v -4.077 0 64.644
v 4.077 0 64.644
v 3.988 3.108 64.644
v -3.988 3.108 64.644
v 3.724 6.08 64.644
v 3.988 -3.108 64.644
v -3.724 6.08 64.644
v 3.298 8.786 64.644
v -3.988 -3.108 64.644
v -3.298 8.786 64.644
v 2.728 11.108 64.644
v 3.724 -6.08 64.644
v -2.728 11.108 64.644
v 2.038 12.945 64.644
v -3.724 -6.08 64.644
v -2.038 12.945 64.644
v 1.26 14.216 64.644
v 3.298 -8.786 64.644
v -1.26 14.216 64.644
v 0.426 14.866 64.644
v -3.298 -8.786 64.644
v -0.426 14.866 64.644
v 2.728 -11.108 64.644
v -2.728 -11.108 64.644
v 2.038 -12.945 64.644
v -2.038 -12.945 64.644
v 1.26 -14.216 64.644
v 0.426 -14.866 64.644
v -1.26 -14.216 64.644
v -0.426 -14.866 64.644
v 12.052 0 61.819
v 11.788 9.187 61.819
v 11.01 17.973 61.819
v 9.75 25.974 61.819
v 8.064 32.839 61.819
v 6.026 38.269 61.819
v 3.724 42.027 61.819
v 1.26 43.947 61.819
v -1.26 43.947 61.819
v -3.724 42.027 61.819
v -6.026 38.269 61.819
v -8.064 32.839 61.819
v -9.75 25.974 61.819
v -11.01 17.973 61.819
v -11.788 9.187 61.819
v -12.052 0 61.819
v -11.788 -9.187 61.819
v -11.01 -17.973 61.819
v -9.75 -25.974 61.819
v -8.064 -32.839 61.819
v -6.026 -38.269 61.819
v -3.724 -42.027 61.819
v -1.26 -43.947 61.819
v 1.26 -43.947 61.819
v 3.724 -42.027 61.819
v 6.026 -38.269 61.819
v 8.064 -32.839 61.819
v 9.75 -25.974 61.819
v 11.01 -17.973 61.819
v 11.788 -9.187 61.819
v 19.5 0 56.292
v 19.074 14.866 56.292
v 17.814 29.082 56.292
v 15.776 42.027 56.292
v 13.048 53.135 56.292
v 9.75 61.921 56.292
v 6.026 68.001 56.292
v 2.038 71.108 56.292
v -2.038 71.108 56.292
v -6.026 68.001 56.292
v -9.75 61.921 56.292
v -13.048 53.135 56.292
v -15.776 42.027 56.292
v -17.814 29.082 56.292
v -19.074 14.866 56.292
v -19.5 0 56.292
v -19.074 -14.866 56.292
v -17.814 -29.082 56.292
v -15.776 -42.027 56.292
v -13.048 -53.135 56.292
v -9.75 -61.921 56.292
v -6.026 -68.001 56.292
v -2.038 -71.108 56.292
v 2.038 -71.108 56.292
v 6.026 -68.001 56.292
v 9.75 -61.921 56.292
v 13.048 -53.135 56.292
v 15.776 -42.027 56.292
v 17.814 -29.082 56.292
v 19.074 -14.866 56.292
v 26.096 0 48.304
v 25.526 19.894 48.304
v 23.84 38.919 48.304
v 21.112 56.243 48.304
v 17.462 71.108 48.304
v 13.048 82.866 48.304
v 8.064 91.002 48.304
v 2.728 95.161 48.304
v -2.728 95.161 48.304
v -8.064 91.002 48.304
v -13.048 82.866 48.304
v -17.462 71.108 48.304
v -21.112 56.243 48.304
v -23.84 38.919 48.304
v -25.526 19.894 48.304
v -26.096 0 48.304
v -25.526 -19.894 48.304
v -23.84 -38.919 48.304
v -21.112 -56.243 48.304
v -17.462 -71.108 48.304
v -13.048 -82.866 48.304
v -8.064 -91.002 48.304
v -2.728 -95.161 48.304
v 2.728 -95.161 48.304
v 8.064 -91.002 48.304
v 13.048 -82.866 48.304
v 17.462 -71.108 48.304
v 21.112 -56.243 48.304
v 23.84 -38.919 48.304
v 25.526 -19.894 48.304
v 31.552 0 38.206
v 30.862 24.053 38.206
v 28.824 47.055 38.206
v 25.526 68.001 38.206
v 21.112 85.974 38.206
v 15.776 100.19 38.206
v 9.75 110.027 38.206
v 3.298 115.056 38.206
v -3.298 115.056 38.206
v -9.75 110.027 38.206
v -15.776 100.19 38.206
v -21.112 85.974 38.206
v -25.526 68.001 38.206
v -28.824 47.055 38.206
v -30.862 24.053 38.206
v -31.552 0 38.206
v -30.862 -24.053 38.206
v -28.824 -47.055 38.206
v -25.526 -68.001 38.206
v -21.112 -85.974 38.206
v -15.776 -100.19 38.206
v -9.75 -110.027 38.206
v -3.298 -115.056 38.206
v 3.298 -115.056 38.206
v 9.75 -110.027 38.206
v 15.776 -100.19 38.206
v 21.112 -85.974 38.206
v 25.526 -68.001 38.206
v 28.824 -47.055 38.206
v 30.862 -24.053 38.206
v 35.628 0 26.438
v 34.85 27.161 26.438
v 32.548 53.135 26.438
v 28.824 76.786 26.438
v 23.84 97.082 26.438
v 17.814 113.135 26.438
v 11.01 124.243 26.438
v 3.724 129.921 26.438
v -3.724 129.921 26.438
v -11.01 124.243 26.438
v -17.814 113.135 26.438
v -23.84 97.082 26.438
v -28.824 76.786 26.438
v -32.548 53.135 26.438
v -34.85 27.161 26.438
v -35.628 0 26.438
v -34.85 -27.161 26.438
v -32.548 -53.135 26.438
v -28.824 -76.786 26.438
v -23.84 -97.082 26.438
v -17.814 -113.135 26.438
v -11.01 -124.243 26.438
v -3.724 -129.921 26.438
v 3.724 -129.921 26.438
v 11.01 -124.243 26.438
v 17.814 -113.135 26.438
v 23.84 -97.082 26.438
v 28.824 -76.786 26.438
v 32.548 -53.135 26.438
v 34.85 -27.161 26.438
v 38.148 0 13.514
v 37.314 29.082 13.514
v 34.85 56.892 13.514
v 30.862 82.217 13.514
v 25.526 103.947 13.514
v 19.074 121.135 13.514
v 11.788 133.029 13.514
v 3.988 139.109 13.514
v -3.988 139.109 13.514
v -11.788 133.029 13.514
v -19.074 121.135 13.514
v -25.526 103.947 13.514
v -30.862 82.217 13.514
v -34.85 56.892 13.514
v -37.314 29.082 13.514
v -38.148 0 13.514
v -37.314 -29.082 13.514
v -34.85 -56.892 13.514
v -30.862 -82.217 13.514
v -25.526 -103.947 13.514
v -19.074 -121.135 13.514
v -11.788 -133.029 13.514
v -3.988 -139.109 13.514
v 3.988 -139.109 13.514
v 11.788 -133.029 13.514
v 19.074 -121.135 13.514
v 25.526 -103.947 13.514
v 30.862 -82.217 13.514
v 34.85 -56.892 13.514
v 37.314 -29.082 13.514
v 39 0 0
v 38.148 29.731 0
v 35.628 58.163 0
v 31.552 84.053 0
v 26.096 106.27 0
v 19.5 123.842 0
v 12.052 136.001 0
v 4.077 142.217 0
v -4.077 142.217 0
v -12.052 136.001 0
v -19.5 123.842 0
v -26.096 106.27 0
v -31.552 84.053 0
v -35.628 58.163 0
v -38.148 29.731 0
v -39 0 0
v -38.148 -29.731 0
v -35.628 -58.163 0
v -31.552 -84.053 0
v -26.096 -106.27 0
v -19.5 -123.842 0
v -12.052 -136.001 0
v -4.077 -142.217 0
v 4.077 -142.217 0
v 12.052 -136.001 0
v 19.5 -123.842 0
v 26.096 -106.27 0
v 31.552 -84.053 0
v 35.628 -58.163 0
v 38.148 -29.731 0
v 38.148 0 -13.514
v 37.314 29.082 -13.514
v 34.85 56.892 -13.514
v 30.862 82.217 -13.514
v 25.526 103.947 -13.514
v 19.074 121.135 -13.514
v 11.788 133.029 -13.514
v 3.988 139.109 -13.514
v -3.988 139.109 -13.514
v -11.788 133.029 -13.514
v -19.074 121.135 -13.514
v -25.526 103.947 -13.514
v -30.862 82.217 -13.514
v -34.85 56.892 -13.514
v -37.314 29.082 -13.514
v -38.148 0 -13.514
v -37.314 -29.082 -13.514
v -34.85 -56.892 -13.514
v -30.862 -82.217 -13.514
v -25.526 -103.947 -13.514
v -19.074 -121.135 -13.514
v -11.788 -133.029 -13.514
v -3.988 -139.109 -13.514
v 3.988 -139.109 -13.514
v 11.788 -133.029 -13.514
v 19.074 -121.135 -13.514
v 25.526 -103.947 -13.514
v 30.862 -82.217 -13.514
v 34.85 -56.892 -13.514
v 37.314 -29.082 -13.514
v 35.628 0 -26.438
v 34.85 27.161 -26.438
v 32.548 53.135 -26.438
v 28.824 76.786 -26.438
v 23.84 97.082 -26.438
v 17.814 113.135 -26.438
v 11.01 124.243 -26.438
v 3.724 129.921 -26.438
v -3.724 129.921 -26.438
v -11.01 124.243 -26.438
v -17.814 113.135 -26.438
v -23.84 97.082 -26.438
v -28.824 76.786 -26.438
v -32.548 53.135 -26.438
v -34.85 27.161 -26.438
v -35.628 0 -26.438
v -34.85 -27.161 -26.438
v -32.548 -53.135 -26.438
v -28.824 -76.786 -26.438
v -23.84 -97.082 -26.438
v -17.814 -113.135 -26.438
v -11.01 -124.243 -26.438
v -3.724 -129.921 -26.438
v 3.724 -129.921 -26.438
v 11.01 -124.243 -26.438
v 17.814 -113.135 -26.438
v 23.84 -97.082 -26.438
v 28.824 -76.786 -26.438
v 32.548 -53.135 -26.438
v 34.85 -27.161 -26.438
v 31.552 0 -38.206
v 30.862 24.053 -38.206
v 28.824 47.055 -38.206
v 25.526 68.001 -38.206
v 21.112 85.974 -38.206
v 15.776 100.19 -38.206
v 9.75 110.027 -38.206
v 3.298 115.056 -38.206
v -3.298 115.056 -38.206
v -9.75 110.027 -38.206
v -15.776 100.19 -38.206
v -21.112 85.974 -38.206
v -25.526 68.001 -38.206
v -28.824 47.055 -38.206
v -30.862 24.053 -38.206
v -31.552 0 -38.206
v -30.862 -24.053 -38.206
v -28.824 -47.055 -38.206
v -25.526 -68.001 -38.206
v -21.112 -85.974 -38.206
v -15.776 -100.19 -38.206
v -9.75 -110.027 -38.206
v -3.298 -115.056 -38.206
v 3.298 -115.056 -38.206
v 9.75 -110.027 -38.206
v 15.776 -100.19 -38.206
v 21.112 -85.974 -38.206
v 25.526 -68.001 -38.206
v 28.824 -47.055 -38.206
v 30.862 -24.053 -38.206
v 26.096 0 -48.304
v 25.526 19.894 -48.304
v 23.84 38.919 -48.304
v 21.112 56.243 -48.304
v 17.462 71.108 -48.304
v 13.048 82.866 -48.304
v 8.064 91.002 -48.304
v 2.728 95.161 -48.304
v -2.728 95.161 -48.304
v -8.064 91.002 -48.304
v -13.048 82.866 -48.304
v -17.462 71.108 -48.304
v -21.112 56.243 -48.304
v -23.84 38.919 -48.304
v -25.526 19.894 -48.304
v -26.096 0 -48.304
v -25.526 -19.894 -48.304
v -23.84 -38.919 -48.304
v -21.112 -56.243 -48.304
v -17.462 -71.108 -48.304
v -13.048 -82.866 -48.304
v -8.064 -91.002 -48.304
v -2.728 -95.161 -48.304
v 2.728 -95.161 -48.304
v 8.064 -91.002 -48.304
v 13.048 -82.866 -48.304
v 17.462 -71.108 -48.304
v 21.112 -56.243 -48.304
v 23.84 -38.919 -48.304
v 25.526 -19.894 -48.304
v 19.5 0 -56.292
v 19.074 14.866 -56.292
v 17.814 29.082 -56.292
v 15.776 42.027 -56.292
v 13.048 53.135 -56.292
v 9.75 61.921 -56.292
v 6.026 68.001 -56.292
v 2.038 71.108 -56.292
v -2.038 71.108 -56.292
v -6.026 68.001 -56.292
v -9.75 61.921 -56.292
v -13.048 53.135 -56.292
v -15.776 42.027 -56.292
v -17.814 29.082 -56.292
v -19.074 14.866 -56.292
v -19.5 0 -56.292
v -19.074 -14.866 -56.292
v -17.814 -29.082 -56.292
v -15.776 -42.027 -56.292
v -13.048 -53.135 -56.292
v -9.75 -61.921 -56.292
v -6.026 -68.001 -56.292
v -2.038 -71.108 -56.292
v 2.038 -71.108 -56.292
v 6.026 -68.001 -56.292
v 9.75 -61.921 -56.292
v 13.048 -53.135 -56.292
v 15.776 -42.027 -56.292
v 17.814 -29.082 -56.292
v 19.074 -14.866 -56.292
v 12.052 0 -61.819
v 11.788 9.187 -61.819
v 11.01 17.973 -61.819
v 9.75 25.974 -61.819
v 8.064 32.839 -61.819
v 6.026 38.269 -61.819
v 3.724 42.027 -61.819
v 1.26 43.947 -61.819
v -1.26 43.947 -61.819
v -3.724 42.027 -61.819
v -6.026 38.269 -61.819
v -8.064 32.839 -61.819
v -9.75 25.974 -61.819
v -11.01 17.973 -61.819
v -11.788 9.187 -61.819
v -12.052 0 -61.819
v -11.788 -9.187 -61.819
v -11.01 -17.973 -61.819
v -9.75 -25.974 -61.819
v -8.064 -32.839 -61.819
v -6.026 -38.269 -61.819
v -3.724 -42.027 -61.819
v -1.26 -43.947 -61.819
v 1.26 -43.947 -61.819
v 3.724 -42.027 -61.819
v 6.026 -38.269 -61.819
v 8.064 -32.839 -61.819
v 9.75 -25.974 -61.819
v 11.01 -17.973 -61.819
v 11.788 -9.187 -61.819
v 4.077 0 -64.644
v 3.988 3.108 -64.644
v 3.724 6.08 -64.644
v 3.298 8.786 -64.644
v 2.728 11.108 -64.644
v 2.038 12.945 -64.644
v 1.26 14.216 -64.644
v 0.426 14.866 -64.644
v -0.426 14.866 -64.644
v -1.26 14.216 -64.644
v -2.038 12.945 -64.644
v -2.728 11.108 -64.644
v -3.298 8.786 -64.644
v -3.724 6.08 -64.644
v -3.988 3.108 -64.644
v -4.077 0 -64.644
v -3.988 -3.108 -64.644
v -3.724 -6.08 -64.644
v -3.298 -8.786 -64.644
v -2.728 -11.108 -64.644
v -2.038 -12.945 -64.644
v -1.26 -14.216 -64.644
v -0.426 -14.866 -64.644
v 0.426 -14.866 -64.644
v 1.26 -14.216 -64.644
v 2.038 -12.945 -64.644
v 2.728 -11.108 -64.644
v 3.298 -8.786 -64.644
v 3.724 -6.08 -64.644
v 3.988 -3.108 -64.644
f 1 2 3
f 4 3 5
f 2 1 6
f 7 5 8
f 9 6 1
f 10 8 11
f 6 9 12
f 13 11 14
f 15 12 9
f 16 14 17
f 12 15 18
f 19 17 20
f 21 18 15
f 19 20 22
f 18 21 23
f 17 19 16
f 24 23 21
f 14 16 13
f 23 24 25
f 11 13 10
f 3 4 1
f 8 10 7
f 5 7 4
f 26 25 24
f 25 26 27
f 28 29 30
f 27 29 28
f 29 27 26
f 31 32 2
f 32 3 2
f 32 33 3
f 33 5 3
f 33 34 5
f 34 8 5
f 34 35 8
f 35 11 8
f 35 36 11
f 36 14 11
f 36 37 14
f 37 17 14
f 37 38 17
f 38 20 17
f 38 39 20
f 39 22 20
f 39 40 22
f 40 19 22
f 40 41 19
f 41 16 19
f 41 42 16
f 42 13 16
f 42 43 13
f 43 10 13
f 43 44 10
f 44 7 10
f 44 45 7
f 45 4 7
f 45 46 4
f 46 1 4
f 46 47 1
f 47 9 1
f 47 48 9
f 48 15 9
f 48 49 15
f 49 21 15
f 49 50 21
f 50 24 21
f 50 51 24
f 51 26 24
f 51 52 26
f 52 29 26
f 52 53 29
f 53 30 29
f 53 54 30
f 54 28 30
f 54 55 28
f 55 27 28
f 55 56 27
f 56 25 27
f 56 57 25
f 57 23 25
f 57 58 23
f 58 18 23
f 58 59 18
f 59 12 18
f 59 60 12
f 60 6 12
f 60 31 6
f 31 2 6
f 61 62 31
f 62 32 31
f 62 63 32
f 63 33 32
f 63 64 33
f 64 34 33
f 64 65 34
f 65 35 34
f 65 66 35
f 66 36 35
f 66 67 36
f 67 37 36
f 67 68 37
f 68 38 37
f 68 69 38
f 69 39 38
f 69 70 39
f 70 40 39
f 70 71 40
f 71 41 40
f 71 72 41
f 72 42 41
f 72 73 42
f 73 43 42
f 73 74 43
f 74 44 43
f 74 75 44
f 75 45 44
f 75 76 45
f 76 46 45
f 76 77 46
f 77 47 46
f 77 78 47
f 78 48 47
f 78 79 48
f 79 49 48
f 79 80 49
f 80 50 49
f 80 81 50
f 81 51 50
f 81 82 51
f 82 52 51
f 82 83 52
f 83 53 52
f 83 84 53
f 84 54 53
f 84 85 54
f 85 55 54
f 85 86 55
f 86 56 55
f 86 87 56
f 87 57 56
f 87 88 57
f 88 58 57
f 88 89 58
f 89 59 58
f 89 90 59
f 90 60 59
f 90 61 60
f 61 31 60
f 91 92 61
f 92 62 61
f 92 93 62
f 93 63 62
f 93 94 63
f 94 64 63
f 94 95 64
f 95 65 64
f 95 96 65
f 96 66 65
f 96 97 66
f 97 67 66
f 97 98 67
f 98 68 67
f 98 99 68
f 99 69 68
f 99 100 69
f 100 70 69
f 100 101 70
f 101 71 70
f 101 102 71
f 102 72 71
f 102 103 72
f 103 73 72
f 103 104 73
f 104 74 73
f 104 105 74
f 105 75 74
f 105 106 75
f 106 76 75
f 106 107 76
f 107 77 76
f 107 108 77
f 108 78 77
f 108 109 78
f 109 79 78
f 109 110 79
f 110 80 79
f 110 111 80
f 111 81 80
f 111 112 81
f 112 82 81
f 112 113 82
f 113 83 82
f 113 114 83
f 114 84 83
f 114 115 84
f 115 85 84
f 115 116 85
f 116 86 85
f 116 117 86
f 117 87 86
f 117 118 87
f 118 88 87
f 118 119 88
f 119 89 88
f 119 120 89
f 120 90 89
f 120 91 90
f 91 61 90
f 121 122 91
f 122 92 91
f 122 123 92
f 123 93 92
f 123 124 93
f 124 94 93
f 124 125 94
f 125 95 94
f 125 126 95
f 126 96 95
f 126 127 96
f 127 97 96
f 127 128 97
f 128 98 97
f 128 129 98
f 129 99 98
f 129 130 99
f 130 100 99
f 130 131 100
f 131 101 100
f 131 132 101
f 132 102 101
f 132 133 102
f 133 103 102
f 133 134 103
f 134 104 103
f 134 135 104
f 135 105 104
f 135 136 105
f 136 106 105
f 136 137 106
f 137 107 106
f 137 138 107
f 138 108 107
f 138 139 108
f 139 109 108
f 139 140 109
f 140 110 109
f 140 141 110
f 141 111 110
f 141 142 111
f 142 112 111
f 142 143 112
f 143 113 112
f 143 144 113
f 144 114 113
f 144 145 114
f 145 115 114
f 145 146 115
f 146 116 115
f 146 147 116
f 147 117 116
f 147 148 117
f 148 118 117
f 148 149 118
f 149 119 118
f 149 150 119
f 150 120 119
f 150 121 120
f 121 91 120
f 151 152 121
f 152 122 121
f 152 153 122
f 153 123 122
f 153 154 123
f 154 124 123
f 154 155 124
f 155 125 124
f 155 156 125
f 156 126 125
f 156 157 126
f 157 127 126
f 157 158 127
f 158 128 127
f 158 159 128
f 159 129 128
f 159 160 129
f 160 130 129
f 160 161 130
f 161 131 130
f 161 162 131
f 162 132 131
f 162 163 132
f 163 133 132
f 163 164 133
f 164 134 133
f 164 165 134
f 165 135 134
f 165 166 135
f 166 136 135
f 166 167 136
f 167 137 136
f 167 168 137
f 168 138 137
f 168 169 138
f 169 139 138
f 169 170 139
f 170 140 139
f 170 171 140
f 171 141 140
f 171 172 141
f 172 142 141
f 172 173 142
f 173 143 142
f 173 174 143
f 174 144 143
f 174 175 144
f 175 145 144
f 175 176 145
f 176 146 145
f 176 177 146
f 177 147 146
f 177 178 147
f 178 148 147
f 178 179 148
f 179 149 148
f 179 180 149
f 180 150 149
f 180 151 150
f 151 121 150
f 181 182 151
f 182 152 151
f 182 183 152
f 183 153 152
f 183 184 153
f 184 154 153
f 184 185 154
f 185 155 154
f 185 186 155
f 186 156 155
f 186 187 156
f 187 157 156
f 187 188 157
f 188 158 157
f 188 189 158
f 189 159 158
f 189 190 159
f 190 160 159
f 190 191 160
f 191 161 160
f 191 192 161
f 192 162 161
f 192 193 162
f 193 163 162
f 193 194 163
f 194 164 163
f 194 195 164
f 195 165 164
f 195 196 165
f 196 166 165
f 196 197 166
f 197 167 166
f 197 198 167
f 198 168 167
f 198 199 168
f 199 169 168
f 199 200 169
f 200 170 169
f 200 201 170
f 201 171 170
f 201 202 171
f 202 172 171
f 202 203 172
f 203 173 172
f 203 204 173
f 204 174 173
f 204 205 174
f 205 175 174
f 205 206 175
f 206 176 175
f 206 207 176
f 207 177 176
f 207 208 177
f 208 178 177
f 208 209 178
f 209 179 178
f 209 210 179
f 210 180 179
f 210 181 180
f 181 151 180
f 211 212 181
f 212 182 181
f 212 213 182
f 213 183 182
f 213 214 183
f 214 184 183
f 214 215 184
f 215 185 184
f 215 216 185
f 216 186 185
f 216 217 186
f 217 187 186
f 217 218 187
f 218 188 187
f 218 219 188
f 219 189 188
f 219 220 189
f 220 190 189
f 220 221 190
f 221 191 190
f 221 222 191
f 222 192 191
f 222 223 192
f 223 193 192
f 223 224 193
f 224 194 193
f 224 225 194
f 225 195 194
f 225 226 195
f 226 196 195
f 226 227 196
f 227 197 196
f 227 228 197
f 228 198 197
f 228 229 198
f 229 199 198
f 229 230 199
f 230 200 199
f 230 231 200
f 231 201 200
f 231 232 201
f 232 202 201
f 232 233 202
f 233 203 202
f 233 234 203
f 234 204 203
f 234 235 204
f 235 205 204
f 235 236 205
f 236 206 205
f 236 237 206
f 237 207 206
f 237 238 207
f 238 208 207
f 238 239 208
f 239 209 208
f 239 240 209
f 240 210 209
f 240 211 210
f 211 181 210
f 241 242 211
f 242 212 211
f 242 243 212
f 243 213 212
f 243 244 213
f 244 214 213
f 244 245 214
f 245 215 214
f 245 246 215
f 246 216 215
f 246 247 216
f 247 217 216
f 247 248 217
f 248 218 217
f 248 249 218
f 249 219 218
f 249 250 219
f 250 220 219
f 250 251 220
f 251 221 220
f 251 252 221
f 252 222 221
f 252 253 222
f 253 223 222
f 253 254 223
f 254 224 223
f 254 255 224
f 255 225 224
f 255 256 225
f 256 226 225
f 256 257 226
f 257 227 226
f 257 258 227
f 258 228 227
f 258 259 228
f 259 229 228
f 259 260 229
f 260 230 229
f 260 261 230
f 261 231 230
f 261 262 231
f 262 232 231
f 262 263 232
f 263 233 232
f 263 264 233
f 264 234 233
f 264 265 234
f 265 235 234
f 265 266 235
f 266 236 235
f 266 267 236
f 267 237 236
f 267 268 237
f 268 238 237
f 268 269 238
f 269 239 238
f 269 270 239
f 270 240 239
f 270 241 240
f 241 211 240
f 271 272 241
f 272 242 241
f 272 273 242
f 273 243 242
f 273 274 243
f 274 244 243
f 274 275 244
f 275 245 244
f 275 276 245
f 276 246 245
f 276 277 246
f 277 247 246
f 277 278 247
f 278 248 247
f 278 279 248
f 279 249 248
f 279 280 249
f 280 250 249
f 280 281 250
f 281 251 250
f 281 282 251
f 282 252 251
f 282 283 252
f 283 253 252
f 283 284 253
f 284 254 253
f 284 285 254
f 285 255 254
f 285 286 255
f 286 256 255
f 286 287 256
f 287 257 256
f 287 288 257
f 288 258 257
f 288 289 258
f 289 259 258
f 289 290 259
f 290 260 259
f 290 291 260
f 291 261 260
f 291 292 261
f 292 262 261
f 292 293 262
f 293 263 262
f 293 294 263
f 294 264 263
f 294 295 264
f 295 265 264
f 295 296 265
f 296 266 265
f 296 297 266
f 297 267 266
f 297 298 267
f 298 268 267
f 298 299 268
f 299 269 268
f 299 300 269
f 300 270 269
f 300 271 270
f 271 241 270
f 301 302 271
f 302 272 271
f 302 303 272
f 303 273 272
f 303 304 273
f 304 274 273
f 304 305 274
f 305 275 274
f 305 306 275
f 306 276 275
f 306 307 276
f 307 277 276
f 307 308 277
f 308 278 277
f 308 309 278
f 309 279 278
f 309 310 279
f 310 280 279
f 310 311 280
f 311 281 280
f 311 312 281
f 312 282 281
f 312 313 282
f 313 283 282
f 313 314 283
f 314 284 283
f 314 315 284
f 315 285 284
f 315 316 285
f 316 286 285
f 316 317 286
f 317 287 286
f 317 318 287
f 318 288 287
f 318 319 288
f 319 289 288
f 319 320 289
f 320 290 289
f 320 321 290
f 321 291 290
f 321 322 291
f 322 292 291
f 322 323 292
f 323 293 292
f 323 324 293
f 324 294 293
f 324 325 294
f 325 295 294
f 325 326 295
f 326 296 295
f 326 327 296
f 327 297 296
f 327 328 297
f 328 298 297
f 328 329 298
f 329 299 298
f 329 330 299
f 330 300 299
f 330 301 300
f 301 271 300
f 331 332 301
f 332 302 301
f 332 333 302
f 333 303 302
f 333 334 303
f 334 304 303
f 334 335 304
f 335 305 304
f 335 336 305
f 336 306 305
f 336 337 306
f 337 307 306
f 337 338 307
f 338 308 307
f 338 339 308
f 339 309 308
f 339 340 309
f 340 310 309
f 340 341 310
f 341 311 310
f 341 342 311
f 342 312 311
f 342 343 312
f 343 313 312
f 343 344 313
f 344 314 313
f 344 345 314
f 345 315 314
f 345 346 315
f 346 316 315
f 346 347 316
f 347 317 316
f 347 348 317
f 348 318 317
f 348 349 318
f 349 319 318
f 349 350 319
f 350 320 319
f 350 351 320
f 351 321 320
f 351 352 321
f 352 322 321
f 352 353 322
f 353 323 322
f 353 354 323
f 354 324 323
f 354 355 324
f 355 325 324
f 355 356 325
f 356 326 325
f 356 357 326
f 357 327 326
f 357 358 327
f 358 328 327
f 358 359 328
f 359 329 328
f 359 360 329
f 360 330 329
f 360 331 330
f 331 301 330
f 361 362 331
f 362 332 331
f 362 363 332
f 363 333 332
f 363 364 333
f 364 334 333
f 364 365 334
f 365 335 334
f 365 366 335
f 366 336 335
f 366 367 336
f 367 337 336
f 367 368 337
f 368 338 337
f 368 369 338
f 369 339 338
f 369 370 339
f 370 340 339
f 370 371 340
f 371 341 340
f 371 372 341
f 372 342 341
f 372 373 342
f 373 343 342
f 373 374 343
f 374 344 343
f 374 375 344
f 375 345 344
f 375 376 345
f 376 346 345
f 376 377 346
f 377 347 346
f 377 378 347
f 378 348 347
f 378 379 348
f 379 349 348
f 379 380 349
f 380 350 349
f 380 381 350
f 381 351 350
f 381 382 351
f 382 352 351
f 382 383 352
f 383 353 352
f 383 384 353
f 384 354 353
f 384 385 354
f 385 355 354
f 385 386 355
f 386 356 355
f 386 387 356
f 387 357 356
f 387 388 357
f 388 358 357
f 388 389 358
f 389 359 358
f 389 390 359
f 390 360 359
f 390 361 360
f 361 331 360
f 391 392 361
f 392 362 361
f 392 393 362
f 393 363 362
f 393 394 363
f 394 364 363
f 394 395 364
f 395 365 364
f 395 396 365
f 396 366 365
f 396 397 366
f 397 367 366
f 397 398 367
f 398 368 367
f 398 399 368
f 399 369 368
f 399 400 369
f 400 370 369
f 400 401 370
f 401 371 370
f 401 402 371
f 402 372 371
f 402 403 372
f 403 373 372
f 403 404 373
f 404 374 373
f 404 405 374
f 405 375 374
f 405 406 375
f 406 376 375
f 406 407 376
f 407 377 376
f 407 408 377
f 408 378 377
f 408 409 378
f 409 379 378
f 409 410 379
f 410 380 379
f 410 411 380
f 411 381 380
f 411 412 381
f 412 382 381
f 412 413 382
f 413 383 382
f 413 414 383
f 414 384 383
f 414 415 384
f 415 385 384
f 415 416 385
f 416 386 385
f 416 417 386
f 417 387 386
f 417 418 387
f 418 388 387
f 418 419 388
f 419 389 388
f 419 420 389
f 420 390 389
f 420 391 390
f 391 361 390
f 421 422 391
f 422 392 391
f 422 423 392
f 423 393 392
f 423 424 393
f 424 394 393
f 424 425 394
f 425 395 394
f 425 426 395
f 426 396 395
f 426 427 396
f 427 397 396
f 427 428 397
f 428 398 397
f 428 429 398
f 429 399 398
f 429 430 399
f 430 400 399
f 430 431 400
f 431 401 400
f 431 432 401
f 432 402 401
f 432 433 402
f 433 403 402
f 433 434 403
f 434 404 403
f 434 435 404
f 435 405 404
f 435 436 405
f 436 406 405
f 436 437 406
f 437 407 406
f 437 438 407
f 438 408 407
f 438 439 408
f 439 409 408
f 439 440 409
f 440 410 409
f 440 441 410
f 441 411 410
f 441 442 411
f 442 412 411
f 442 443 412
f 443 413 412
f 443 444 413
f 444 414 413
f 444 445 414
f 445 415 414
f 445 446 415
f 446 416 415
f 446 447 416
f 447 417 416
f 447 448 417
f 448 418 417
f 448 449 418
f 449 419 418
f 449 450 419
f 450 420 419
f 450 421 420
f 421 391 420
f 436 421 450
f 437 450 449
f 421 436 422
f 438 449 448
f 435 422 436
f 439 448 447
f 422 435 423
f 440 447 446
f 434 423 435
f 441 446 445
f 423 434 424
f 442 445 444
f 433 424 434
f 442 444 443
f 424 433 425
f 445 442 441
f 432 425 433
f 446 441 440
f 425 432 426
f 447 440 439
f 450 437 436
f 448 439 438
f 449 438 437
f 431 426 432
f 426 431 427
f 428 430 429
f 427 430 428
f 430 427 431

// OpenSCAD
// Generated by SolidPython 1.0.1 on 2020-07-29 00:46:45


scale(v = [3, 11, 5]) {
	sphere(r = 13);
}
/***********************************************
*********      SolidPython code:      **********
************************************************
 
# import packages: SolidPython
from solid import *
from solid.utils import *
from itertools import chain, combinations, permutations


class Resize:

    def __init__(self, scad_file):
        self.scad_file = scad_file
        #self.scad_file = import_scad(scad_file)
        # cone/cylinder param:
        self.r1 = 0
        self.r2 = 0
        self.h = 0
        # rectangular prism param:
        self.w = 0
        self.l = 0
        # ellipse param:
        self.r = 0

    # import OpenScad code (file name corresponds to shape)


    # classify shape + parameters
    def assign(self, param1, param2, param3):
        if self.scad_file == 'cone.scad':
            self.r1 = param1
            self.r2 = param2
            self.h = param3
        elif self.scad_file == 'cylinder.scad':
            self.r1 = param1
            self.r2 = param2
            self.h = param3
        elif self.scad_file == 'rectangularPrism.scad':
            self.h = param1
            self.l = param2
            self.w = param3
        else:
            self.r = param1
            self.h = param2

    # resize parameters
    def iterate(self):
        x = range(3, 20, 2)
        i = 1
        if self.scad_file == 'cone.scad':
            tempList = list(permutations(x, 2))
            for temp in tempList:
                param1 = temp[0]
                param2 = temp[1]
                filepath = 'produced_scad_files/' + 'cone' + str(param1) + '_' + str(param2) + '_' + '.scad'
                scad_render_to_file(cylinder(h=param1, r1=param2, r2=0), filepath)

        elif self.scad_file == 'cylinder.scad':
            tempList = list(permutations(x, 3))
            for temp in tempList:
                param1 = temp[0]
                param2 = temp[1]
                filepath = 'produced_scad_files/' + 'cylinder' + str(param1) + '_' + str(param2) + '_' + '.scad'
                scad_render_to_file(cylinder(h=param1, r1=param2, r2=param2), filepath)

        elif self.scad_file == 'rectangularPrism.scad':
            tempList = list(permutations(x, 3))
            for temp in tempList:
                param1 = temp[0]
                param2 = temp[1]
                param3 = temp[2]
                filepath = 'produced_scad_files/' + 'rectangularPrism' + str(param1) + '_' + str(param2) + '_' + str(
                    param3) + '.scad'
                scad_render_to_file(cube(size=(param1, param2, param3)), filepath)

        elif self.scad_file == 'ellipse.scad':
            tempList = list(permutations(x, 4))
            for temp in tempList:
                param1 = temp[0]
                param2 = temp[1]
                param3 = temp[2]
                param4 = temp[3]
                filepath = 'produced_scad_files/' + 'ellipse' + str(param1) + '_' + str(param2) + '_' + str(param3) + '_' + str(param4) + '.scad'
                scad_render_to_file(scale([param1, param2, param3])(sphere(r=param4)), filepath)

    def render_to_scadfile(self):
        scad_render_to_file(scad, 'example.scad') 
 
************************************************/
